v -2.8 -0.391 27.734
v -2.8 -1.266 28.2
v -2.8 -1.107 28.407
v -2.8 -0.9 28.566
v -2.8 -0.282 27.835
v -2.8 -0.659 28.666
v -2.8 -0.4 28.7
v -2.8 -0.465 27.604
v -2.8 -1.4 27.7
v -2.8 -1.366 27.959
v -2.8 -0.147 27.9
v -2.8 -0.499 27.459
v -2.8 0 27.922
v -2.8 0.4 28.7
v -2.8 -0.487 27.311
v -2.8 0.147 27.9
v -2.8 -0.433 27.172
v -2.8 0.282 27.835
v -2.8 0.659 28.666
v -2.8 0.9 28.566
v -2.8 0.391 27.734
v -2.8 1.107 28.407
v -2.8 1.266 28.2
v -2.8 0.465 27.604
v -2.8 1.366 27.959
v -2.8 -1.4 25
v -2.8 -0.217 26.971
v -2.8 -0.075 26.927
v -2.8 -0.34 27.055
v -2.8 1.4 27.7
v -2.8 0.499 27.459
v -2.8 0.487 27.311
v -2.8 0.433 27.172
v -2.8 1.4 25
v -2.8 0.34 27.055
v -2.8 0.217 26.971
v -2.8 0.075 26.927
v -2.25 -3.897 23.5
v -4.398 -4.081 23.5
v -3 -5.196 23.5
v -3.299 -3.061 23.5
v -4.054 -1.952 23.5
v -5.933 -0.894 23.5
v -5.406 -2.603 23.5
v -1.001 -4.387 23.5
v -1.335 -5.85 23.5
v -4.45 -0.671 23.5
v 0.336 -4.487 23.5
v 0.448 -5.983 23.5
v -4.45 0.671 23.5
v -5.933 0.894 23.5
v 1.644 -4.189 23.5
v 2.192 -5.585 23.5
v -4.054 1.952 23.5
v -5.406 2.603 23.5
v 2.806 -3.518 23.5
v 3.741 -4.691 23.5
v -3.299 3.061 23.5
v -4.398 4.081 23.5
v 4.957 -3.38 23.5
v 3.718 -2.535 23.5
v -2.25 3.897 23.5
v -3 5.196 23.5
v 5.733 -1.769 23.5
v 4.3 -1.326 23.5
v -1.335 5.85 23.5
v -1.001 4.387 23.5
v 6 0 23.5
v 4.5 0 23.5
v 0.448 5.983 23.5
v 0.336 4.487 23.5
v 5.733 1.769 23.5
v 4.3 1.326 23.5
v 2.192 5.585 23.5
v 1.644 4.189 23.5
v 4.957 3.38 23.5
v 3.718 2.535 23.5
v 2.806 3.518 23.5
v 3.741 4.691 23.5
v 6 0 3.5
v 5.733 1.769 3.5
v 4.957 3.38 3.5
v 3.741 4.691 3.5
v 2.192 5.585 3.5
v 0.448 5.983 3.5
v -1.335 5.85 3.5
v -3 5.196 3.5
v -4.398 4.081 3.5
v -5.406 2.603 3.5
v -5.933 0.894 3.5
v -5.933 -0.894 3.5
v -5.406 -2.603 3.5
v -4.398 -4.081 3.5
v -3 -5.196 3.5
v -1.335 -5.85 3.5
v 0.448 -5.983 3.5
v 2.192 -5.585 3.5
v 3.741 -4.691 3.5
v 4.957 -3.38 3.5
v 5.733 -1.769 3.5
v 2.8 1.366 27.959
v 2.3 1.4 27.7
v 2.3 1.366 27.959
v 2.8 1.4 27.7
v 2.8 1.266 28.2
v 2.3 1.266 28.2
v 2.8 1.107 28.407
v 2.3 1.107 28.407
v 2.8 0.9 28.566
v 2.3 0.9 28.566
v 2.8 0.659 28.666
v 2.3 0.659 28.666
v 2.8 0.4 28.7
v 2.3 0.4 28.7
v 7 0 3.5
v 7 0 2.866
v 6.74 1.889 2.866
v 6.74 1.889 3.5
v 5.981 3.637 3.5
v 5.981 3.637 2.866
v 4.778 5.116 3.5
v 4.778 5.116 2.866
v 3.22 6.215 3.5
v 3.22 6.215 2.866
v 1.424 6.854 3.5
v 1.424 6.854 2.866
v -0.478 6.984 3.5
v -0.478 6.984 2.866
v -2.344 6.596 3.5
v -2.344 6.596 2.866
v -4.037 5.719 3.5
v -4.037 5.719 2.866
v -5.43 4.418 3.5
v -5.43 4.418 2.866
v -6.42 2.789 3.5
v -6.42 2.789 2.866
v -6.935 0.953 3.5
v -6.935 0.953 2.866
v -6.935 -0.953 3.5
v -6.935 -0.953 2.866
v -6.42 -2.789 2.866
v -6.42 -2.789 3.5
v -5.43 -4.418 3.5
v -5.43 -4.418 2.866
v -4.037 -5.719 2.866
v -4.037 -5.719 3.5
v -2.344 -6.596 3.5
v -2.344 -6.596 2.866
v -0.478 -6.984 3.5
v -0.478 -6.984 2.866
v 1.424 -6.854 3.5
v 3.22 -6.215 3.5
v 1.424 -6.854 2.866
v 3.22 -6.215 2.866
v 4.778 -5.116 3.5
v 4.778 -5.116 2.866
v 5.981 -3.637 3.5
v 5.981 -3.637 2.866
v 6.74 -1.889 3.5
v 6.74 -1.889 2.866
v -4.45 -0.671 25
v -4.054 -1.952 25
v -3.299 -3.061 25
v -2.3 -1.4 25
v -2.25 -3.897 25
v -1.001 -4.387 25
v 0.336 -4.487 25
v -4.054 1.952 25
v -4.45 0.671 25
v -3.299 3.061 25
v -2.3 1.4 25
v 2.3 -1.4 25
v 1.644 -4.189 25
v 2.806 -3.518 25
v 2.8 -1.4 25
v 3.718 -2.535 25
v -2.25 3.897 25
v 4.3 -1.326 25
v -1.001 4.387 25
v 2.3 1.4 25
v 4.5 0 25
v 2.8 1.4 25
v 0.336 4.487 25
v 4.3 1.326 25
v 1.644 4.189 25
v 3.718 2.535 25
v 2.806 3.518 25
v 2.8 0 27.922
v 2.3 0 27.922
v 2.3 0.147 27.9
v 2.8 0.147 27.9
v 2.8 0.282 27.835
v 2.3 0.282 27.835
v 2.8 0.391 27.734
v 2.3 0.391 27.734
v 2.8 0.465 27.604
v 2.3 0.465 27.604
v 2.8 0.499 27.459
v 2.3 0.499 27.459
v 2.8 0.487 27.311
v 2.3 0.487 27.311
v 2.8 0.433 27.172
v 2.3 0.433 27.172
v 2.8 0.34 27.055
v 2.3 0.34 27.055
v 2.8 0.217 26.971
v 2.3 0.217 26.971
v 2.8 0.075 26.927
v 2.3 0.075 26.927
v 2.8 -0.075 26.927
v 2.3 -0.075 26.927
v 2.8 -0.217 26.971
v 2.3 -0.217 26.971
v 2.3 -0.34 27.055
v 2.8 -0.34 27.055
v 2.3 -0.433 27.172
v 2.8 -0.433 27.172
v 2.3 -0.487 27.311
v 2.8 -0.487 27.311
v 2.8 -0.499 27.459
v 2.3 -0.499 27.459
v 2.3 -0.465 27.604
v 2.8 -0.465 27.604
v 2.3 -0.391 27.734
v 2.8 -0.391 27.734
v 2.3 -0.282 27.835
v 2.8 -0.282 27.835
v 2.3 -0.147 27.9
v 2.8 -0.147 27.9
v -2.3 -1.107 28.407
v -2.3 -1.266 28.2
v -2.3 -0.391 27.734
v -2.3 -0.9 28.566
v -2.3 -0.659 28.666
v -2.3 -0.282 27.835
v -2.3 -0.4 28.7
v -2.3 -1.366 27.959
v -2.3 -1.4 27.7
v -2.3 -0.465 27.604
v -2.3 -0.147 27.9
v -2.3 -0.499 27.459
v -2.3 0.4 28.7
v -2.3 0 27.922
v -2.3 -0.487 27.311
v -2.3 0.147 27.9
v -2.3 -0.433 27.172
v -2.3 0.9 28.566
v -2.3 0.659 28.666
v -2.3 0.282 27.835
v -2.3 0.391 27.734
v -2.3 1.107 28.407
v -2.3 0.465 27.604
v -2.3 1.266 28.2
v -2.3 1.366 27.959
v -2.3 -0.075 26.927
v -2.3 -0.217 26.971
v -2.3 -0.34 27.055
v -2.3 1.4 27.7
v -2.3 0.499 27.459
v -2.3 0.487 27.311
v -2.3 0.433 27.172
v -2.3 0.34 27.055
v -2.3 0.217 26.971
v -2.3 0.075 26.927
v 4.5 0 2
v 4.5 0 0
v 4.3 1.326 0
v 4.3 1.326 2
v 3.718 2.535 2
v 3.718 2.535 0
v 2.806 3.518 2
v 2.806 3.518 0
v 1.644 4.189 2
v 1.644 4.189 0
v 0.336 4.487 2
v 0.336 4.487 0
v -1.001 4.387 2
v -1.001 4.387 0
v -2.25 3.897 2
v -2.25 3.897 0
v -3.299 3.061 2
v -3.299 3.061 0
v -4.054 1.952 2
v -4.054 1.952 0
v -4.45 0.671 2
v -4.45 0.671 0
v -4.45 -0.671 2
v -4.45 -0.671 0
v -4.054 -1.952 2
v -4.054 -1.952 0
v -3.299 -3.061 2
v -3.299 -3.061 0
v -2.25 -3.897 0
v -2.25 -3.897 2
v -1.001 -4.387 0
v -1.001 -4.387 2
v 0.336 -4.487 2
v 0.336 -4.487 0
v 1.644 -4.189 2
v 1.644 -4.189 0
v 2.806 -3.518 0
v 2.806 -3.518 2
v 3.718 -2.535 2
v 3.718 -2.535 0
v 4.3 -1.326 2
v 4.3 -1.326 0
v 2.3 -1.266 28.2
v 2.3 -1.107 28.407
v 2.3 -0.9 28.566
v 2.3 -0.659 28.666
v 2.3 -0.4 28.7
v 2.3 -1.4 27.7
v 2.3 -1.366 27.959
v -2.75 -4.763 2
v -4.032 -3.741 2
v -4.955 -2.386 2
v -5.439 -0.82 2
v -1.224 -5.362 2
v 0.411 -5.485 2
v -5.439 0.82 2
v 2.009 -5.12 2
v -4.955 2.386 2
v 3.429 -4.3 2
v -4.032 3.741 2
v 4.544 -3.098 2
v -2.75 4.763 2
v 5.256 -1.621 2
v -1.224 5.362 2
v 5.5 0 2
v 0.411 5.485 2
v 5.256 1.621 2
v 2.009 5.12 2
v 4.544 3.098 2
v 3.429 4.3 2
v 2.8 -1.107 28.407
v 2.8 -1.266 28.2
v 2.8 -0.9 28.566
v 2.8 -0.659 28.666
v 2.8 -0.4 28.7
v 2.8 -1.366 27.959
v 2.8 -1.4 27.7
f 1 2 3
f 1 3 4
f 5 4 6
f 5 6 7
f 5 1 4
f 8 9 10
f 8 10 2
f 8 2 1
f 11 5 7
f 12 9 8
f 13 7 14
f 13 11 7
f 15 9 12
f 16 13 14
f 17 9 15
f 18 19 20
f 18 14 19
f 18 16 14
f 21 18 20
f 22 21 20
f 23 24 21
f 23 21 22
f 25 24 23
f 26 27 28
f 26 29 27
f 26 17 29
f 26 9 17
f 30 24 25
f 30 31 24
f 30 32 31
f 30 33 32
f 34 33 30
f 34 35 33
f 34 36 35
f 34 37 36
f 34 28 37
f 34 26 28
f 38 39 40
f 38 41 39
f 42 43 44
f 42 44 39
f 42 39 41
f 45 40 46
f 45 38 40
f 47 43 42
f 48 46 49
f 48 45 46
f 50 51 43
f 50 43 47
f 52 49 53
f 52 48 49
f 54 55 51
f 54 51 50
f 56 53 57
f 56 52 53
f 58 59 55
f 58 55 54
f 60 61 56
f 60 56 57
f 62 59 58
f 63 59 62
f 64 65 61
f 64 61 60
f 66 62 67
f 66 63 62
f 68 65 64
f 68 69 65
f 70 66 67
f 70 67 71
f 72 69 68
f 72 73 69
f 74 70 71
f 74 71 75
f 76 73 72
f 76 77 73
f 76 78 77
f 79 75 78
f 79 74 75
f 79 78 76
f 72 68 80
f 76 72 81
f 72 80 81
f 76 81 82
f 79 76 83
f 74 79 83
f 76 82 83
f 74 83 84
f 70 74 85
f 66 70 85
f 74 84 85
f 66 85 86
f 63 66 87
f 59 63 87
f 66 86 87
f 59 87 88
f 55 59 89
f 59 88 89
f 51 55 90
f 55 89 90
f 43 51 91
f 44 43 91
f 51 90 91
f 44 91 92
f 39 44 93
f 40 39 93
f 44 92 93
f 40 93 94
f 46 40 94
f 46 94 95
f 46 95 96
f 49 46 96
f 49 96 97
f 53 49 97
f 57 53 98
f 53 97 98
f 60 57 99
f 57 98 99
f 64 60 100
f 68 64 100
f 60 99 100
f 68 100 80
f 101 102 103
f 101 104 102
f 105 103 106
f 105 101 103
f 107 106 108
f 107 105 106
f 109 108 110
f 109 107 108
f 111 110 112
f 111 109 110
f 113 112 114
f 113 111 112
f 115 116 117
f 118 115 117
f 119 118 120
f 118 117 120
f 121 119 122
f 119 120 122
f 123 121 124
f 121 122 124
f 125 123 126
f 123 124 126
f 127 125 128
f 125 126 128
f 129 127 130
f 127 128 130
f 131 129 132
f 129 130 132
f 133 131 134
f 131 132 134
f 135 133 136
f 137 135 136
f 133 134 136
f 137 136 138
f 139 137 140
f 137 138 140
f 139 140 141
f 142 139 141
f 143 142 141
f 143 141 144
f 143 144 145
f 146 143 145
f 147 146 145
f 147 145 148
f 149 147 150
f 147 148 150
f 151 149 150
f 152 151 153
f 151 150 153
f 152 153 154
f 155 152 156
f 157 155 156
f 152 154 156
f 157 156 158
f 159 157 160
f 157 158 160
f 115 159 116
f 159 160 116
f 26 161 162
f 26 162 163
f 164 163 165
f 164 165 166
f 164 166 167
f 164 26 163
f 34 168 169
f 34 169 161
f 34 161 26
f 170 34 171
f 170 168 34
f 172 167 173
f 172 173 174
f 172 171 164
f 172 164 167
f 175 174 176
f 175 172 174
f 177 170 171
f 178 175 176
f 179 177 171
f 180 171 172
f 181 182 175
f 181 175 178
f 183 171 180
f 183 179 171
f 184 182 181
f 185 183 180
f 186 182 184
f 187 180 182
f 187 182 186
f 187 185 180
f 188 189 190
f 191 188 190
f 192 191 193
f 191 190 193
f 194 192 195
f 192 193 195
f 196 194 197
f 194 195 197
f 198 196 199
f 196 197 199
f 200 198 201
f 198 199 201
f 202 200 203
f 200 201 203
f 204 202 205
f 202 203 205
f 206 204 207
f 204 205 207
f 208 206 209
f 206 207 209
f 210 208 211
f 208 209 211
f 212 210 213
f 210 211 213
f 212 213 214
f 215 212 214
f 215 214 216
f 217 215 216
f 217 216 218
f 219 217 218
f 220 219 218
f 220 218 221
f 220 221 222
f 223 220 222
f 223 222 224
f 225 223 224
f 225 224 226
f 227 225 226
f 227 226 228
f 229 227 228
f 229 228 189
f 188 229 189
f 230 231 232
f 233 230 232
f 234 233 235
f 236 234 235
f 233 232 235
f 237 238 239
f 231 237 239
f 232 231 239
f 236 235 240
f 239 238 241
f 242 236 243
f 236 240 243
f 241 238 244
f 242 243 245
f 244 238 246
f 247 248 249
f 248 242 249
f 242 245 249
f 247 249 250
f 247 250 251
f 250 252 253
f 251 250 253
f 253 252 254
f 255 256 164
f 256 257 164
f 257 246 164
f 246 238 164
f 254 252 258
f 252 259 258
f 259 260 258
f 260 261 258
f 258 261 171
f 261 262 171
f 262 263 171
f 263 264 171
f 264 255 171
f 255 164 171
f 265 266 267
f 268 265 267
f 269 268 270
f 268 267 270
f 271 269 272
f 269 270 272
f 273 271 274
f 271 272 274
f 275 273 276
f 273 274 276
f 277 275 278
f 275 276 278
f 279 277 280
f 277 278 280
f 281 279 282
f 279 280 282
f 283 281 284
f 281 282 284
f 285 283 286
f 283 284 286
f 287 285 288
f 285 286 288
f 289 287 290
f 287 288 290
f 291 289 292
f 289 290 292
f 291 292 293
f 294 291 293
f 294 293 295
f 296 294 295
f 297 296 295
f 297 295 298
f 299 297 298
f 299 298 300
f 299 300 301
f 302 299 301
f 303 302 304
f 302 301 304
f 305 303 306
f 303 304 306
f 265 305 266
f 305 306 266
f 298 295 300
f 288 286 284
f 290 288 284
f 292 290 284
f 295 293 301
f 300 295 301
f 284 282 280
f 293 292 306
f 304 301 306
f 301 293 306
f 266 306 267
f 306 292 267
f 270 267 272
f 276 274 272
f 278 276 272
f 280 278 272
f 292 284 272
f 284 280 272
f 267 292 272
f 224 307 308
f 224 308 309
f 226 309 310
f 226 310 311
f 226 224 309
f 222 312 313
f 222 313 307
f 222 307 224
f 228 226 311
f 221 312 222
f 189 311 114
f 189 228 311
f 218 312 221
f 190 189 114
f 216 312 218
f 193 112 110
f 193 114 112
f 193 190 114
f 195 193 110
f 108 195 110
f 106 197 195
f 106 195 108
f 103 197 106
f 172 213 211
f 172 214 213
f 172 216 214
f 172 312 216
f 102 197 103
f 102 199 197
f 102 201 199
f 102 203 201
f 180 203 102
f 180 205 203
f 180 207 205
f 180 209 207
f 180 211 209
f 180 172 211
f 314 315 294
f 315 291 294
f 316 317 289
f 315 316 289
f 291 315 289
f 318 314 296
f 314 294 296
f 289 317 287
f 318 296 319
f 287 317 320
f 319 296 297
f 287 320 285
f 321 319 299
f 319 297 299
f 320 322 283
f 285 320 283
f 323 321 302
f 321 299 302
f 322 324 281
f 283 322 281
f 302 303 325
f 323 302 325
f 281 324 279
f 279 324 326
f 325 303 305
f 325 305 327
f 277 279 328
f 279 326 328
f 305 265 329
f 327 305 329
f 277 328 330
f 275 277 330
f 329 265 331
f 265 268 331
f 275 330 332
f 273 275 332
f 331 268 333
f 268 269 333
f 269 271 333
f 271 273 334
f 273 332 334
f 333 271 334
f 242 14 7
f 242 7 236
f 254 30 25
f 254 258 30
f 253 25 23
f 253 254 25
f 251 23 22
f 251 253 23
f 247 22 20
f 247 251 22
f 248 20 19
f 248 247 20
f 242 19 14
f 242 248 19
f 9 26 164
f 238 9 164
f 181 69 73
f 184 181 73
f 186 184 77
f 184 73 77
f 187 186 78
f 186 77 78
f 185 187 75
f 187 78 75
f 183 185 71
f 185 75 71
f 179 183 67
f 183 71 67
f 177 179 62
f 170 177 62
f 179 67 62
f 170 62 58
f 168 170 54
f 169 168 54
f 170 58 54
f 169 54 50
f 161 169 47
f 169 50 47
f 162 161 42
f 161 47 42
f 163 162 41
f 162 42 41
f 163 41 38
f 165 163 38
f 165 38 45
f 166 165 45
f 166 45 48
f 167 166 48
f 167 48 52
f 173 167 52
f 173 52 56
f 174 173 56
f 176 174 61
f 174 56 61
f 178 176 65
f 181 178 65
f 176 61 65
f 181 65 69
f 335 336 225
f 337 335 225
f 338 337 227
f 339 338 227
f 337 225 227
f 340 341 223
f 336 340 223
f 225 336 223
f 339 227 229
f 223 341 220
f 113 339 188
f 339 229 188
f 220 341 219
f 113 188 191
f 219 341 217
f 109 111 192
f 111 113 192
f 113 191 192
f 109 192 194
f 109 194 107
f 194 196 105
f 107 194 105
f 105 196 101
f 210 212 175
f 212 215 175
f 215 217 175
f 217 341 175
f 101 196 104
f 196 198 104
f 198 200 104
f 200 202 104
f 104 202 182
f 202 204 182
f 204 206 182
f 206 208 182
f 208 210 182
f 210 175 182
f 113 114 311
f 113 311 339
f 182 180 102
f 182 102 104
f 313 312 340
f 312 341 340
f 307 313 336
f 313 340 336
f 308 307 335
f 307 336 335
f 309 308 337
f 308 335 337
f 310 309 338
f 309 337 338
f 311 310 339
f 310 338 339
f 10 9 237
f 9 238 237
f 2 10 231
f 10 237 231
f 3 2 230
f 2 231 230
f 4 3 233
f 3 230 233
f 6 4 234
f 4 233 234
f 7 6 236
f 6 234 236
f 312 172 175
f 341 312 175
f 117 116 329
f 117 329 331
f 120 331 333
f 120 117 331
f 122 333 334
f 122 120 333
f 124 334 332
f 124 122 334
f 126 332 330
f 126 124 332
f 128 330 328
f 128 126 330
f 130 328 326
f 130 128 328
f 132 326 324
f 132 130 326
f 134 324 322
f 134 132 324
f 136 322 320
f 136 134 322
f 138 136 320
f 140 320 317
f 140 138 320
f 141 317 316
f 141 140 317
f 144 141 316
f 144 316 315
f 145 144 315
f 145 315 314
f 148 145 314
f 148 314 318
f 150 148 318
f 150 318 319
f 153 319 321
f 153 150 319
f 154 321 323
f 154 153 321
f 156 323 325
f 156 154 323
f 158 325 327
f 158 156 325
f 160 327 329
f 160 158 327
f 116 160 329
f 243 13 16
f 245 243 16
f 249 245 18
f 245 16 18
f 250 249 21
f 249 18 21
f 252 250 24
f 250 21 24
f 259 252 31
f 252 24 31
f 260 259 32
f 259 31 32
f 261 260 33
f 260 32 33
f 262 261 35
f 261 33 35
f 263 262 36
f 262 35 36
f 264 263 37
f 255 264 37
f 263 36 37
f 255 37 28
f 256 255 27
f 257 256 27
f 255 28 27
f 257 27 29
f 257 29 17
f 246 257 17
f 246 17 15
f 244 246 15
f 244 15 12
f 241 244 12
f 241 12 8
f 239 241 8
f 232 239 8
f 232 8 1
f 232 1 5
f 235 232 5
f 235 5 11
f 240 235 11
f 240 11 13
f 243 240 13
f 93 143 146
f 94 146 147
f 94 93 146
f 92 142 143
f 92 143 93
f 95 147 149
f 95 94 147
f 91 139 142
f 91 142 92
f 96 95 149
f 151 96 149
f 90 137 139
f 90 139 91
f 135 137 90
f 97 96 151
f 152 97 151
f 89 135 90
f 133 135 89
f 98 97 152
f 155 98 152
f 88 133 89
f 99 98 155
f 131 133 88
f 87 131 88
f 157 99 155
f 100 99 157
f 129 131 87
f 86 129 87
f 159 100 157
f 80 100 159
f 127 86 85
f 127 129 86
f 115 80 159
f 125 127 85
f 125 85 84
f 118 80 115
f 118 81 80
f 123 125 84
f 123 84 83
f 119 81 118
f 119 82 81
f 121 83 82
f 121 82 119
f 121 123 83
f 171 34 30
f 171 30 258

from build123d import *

# Parameters (mm, degrees)
SKETCH_1_R          = 4.5
EXTRUDE_1_DEPTH     = 2
SKETCH_2_R          = 7
EXTRUDE_2_DEPTH     = 1.5
SKETCH_3_R          = 6
EXTRUDE_3_DEPTH     = 20
SKETCH_4_R          = 4.5
EXTRUDE_4_DEPTH     = 1.5
SKETCH_5_W          = 0.5
SKETCH_5_H          = 2.8
EXTRUDE_5_DEPTH     = 3.7
CHAMFER_1_SIZE      = 1.5
CHAMFER_1_SIZE2     = 0.866025404
FILLET_1_R          = 1
SKETCH_6_R          = 0.5
CUT_EXTRUDE_1_DEPTH = 32.124427706


with BuildPart() as part:
    # 스케치1 → 보스-돌출1 (new body)
    with BuildSketch(Plane.XY):
        Circle(SKETCH_1_R)
    extrude(amount=EXTRUDE_1_DEPTH)

    # 스케치2 → 보스-돌출2 (add)
    with BuildSketch(Plane.XY.offset(2)):
        Circle(SKETCH_2_R)
    extrude(amount=EXTRUDE_2_DEPTH)

    # 스케치3 → 보스-돌출3 (add)
    with BuildSketch(Plane.XY.offset(3.5)):
        Circle(SKETCH_3_R)
    extrude(amount=EXTRUDE_3_DEPTH)

    # 스케치4 → 보스-돌출4 (add)
    with BuildSketch(Plane.XY.offset(23.5)):
        Circle(SKETCH_4_R)
    extrude(amount=EXTRUDE_4_DEPTH)

    # 스케치5 → 보스-돌출5 (add)
    with BuildSketch(Plane.XY.offset(25)):
        with Locations((2.55, 0)):
            Rectangle(SKETCH_5_W, SKETCH_5_H)
        with Locations((-2.55, 0)):
            Rectangle(SKETCH_5_W, SKETCH_5_H)
    extrude(amount=EXTRUDE_5_DEPTH)

    # 모따기1
    chamfer_1_edges = [part.edges().sort_by_distance(p)[0] for p in [
        (-7, 0, 2),
    ]]
    chamfer_1_side = [part.faces().sort_by_distance(p)[0] for p in [
        (-6.802010101, 0, 2),
    ]]
    chamfer(chamfer_1_edges, length=CHAMFER_1_SIZE, length2=CHAMFER_1_SIZE2, reference=chamfer_1_side[0])

    # 필렛1
    fillet_1_edges = [part.edges().sort_by_distance(p)[0] for p in [
        (-2.55, 1.4, 28.7),
        (-2.55, -1.4, 28.7),
        (2.55, 1.4, 28.7),
        (2.55, -1.4, 28.7),
    ]]
    fillet(fillet_1_edges, radius=FILLET_1_R)

    # 스케치6 → 컷-돌출1 (cut, through all)
    with BuildSketch(Plane.ZY.offset(2.8)):
        with Locations((27.421769494, 0)):
            Circle(SKETCH_6_R)
    extrude(amount=-CUT_EXTRUDE_1_DEPTH, mode=Mode.SUBTRACT)


solid = part.part
